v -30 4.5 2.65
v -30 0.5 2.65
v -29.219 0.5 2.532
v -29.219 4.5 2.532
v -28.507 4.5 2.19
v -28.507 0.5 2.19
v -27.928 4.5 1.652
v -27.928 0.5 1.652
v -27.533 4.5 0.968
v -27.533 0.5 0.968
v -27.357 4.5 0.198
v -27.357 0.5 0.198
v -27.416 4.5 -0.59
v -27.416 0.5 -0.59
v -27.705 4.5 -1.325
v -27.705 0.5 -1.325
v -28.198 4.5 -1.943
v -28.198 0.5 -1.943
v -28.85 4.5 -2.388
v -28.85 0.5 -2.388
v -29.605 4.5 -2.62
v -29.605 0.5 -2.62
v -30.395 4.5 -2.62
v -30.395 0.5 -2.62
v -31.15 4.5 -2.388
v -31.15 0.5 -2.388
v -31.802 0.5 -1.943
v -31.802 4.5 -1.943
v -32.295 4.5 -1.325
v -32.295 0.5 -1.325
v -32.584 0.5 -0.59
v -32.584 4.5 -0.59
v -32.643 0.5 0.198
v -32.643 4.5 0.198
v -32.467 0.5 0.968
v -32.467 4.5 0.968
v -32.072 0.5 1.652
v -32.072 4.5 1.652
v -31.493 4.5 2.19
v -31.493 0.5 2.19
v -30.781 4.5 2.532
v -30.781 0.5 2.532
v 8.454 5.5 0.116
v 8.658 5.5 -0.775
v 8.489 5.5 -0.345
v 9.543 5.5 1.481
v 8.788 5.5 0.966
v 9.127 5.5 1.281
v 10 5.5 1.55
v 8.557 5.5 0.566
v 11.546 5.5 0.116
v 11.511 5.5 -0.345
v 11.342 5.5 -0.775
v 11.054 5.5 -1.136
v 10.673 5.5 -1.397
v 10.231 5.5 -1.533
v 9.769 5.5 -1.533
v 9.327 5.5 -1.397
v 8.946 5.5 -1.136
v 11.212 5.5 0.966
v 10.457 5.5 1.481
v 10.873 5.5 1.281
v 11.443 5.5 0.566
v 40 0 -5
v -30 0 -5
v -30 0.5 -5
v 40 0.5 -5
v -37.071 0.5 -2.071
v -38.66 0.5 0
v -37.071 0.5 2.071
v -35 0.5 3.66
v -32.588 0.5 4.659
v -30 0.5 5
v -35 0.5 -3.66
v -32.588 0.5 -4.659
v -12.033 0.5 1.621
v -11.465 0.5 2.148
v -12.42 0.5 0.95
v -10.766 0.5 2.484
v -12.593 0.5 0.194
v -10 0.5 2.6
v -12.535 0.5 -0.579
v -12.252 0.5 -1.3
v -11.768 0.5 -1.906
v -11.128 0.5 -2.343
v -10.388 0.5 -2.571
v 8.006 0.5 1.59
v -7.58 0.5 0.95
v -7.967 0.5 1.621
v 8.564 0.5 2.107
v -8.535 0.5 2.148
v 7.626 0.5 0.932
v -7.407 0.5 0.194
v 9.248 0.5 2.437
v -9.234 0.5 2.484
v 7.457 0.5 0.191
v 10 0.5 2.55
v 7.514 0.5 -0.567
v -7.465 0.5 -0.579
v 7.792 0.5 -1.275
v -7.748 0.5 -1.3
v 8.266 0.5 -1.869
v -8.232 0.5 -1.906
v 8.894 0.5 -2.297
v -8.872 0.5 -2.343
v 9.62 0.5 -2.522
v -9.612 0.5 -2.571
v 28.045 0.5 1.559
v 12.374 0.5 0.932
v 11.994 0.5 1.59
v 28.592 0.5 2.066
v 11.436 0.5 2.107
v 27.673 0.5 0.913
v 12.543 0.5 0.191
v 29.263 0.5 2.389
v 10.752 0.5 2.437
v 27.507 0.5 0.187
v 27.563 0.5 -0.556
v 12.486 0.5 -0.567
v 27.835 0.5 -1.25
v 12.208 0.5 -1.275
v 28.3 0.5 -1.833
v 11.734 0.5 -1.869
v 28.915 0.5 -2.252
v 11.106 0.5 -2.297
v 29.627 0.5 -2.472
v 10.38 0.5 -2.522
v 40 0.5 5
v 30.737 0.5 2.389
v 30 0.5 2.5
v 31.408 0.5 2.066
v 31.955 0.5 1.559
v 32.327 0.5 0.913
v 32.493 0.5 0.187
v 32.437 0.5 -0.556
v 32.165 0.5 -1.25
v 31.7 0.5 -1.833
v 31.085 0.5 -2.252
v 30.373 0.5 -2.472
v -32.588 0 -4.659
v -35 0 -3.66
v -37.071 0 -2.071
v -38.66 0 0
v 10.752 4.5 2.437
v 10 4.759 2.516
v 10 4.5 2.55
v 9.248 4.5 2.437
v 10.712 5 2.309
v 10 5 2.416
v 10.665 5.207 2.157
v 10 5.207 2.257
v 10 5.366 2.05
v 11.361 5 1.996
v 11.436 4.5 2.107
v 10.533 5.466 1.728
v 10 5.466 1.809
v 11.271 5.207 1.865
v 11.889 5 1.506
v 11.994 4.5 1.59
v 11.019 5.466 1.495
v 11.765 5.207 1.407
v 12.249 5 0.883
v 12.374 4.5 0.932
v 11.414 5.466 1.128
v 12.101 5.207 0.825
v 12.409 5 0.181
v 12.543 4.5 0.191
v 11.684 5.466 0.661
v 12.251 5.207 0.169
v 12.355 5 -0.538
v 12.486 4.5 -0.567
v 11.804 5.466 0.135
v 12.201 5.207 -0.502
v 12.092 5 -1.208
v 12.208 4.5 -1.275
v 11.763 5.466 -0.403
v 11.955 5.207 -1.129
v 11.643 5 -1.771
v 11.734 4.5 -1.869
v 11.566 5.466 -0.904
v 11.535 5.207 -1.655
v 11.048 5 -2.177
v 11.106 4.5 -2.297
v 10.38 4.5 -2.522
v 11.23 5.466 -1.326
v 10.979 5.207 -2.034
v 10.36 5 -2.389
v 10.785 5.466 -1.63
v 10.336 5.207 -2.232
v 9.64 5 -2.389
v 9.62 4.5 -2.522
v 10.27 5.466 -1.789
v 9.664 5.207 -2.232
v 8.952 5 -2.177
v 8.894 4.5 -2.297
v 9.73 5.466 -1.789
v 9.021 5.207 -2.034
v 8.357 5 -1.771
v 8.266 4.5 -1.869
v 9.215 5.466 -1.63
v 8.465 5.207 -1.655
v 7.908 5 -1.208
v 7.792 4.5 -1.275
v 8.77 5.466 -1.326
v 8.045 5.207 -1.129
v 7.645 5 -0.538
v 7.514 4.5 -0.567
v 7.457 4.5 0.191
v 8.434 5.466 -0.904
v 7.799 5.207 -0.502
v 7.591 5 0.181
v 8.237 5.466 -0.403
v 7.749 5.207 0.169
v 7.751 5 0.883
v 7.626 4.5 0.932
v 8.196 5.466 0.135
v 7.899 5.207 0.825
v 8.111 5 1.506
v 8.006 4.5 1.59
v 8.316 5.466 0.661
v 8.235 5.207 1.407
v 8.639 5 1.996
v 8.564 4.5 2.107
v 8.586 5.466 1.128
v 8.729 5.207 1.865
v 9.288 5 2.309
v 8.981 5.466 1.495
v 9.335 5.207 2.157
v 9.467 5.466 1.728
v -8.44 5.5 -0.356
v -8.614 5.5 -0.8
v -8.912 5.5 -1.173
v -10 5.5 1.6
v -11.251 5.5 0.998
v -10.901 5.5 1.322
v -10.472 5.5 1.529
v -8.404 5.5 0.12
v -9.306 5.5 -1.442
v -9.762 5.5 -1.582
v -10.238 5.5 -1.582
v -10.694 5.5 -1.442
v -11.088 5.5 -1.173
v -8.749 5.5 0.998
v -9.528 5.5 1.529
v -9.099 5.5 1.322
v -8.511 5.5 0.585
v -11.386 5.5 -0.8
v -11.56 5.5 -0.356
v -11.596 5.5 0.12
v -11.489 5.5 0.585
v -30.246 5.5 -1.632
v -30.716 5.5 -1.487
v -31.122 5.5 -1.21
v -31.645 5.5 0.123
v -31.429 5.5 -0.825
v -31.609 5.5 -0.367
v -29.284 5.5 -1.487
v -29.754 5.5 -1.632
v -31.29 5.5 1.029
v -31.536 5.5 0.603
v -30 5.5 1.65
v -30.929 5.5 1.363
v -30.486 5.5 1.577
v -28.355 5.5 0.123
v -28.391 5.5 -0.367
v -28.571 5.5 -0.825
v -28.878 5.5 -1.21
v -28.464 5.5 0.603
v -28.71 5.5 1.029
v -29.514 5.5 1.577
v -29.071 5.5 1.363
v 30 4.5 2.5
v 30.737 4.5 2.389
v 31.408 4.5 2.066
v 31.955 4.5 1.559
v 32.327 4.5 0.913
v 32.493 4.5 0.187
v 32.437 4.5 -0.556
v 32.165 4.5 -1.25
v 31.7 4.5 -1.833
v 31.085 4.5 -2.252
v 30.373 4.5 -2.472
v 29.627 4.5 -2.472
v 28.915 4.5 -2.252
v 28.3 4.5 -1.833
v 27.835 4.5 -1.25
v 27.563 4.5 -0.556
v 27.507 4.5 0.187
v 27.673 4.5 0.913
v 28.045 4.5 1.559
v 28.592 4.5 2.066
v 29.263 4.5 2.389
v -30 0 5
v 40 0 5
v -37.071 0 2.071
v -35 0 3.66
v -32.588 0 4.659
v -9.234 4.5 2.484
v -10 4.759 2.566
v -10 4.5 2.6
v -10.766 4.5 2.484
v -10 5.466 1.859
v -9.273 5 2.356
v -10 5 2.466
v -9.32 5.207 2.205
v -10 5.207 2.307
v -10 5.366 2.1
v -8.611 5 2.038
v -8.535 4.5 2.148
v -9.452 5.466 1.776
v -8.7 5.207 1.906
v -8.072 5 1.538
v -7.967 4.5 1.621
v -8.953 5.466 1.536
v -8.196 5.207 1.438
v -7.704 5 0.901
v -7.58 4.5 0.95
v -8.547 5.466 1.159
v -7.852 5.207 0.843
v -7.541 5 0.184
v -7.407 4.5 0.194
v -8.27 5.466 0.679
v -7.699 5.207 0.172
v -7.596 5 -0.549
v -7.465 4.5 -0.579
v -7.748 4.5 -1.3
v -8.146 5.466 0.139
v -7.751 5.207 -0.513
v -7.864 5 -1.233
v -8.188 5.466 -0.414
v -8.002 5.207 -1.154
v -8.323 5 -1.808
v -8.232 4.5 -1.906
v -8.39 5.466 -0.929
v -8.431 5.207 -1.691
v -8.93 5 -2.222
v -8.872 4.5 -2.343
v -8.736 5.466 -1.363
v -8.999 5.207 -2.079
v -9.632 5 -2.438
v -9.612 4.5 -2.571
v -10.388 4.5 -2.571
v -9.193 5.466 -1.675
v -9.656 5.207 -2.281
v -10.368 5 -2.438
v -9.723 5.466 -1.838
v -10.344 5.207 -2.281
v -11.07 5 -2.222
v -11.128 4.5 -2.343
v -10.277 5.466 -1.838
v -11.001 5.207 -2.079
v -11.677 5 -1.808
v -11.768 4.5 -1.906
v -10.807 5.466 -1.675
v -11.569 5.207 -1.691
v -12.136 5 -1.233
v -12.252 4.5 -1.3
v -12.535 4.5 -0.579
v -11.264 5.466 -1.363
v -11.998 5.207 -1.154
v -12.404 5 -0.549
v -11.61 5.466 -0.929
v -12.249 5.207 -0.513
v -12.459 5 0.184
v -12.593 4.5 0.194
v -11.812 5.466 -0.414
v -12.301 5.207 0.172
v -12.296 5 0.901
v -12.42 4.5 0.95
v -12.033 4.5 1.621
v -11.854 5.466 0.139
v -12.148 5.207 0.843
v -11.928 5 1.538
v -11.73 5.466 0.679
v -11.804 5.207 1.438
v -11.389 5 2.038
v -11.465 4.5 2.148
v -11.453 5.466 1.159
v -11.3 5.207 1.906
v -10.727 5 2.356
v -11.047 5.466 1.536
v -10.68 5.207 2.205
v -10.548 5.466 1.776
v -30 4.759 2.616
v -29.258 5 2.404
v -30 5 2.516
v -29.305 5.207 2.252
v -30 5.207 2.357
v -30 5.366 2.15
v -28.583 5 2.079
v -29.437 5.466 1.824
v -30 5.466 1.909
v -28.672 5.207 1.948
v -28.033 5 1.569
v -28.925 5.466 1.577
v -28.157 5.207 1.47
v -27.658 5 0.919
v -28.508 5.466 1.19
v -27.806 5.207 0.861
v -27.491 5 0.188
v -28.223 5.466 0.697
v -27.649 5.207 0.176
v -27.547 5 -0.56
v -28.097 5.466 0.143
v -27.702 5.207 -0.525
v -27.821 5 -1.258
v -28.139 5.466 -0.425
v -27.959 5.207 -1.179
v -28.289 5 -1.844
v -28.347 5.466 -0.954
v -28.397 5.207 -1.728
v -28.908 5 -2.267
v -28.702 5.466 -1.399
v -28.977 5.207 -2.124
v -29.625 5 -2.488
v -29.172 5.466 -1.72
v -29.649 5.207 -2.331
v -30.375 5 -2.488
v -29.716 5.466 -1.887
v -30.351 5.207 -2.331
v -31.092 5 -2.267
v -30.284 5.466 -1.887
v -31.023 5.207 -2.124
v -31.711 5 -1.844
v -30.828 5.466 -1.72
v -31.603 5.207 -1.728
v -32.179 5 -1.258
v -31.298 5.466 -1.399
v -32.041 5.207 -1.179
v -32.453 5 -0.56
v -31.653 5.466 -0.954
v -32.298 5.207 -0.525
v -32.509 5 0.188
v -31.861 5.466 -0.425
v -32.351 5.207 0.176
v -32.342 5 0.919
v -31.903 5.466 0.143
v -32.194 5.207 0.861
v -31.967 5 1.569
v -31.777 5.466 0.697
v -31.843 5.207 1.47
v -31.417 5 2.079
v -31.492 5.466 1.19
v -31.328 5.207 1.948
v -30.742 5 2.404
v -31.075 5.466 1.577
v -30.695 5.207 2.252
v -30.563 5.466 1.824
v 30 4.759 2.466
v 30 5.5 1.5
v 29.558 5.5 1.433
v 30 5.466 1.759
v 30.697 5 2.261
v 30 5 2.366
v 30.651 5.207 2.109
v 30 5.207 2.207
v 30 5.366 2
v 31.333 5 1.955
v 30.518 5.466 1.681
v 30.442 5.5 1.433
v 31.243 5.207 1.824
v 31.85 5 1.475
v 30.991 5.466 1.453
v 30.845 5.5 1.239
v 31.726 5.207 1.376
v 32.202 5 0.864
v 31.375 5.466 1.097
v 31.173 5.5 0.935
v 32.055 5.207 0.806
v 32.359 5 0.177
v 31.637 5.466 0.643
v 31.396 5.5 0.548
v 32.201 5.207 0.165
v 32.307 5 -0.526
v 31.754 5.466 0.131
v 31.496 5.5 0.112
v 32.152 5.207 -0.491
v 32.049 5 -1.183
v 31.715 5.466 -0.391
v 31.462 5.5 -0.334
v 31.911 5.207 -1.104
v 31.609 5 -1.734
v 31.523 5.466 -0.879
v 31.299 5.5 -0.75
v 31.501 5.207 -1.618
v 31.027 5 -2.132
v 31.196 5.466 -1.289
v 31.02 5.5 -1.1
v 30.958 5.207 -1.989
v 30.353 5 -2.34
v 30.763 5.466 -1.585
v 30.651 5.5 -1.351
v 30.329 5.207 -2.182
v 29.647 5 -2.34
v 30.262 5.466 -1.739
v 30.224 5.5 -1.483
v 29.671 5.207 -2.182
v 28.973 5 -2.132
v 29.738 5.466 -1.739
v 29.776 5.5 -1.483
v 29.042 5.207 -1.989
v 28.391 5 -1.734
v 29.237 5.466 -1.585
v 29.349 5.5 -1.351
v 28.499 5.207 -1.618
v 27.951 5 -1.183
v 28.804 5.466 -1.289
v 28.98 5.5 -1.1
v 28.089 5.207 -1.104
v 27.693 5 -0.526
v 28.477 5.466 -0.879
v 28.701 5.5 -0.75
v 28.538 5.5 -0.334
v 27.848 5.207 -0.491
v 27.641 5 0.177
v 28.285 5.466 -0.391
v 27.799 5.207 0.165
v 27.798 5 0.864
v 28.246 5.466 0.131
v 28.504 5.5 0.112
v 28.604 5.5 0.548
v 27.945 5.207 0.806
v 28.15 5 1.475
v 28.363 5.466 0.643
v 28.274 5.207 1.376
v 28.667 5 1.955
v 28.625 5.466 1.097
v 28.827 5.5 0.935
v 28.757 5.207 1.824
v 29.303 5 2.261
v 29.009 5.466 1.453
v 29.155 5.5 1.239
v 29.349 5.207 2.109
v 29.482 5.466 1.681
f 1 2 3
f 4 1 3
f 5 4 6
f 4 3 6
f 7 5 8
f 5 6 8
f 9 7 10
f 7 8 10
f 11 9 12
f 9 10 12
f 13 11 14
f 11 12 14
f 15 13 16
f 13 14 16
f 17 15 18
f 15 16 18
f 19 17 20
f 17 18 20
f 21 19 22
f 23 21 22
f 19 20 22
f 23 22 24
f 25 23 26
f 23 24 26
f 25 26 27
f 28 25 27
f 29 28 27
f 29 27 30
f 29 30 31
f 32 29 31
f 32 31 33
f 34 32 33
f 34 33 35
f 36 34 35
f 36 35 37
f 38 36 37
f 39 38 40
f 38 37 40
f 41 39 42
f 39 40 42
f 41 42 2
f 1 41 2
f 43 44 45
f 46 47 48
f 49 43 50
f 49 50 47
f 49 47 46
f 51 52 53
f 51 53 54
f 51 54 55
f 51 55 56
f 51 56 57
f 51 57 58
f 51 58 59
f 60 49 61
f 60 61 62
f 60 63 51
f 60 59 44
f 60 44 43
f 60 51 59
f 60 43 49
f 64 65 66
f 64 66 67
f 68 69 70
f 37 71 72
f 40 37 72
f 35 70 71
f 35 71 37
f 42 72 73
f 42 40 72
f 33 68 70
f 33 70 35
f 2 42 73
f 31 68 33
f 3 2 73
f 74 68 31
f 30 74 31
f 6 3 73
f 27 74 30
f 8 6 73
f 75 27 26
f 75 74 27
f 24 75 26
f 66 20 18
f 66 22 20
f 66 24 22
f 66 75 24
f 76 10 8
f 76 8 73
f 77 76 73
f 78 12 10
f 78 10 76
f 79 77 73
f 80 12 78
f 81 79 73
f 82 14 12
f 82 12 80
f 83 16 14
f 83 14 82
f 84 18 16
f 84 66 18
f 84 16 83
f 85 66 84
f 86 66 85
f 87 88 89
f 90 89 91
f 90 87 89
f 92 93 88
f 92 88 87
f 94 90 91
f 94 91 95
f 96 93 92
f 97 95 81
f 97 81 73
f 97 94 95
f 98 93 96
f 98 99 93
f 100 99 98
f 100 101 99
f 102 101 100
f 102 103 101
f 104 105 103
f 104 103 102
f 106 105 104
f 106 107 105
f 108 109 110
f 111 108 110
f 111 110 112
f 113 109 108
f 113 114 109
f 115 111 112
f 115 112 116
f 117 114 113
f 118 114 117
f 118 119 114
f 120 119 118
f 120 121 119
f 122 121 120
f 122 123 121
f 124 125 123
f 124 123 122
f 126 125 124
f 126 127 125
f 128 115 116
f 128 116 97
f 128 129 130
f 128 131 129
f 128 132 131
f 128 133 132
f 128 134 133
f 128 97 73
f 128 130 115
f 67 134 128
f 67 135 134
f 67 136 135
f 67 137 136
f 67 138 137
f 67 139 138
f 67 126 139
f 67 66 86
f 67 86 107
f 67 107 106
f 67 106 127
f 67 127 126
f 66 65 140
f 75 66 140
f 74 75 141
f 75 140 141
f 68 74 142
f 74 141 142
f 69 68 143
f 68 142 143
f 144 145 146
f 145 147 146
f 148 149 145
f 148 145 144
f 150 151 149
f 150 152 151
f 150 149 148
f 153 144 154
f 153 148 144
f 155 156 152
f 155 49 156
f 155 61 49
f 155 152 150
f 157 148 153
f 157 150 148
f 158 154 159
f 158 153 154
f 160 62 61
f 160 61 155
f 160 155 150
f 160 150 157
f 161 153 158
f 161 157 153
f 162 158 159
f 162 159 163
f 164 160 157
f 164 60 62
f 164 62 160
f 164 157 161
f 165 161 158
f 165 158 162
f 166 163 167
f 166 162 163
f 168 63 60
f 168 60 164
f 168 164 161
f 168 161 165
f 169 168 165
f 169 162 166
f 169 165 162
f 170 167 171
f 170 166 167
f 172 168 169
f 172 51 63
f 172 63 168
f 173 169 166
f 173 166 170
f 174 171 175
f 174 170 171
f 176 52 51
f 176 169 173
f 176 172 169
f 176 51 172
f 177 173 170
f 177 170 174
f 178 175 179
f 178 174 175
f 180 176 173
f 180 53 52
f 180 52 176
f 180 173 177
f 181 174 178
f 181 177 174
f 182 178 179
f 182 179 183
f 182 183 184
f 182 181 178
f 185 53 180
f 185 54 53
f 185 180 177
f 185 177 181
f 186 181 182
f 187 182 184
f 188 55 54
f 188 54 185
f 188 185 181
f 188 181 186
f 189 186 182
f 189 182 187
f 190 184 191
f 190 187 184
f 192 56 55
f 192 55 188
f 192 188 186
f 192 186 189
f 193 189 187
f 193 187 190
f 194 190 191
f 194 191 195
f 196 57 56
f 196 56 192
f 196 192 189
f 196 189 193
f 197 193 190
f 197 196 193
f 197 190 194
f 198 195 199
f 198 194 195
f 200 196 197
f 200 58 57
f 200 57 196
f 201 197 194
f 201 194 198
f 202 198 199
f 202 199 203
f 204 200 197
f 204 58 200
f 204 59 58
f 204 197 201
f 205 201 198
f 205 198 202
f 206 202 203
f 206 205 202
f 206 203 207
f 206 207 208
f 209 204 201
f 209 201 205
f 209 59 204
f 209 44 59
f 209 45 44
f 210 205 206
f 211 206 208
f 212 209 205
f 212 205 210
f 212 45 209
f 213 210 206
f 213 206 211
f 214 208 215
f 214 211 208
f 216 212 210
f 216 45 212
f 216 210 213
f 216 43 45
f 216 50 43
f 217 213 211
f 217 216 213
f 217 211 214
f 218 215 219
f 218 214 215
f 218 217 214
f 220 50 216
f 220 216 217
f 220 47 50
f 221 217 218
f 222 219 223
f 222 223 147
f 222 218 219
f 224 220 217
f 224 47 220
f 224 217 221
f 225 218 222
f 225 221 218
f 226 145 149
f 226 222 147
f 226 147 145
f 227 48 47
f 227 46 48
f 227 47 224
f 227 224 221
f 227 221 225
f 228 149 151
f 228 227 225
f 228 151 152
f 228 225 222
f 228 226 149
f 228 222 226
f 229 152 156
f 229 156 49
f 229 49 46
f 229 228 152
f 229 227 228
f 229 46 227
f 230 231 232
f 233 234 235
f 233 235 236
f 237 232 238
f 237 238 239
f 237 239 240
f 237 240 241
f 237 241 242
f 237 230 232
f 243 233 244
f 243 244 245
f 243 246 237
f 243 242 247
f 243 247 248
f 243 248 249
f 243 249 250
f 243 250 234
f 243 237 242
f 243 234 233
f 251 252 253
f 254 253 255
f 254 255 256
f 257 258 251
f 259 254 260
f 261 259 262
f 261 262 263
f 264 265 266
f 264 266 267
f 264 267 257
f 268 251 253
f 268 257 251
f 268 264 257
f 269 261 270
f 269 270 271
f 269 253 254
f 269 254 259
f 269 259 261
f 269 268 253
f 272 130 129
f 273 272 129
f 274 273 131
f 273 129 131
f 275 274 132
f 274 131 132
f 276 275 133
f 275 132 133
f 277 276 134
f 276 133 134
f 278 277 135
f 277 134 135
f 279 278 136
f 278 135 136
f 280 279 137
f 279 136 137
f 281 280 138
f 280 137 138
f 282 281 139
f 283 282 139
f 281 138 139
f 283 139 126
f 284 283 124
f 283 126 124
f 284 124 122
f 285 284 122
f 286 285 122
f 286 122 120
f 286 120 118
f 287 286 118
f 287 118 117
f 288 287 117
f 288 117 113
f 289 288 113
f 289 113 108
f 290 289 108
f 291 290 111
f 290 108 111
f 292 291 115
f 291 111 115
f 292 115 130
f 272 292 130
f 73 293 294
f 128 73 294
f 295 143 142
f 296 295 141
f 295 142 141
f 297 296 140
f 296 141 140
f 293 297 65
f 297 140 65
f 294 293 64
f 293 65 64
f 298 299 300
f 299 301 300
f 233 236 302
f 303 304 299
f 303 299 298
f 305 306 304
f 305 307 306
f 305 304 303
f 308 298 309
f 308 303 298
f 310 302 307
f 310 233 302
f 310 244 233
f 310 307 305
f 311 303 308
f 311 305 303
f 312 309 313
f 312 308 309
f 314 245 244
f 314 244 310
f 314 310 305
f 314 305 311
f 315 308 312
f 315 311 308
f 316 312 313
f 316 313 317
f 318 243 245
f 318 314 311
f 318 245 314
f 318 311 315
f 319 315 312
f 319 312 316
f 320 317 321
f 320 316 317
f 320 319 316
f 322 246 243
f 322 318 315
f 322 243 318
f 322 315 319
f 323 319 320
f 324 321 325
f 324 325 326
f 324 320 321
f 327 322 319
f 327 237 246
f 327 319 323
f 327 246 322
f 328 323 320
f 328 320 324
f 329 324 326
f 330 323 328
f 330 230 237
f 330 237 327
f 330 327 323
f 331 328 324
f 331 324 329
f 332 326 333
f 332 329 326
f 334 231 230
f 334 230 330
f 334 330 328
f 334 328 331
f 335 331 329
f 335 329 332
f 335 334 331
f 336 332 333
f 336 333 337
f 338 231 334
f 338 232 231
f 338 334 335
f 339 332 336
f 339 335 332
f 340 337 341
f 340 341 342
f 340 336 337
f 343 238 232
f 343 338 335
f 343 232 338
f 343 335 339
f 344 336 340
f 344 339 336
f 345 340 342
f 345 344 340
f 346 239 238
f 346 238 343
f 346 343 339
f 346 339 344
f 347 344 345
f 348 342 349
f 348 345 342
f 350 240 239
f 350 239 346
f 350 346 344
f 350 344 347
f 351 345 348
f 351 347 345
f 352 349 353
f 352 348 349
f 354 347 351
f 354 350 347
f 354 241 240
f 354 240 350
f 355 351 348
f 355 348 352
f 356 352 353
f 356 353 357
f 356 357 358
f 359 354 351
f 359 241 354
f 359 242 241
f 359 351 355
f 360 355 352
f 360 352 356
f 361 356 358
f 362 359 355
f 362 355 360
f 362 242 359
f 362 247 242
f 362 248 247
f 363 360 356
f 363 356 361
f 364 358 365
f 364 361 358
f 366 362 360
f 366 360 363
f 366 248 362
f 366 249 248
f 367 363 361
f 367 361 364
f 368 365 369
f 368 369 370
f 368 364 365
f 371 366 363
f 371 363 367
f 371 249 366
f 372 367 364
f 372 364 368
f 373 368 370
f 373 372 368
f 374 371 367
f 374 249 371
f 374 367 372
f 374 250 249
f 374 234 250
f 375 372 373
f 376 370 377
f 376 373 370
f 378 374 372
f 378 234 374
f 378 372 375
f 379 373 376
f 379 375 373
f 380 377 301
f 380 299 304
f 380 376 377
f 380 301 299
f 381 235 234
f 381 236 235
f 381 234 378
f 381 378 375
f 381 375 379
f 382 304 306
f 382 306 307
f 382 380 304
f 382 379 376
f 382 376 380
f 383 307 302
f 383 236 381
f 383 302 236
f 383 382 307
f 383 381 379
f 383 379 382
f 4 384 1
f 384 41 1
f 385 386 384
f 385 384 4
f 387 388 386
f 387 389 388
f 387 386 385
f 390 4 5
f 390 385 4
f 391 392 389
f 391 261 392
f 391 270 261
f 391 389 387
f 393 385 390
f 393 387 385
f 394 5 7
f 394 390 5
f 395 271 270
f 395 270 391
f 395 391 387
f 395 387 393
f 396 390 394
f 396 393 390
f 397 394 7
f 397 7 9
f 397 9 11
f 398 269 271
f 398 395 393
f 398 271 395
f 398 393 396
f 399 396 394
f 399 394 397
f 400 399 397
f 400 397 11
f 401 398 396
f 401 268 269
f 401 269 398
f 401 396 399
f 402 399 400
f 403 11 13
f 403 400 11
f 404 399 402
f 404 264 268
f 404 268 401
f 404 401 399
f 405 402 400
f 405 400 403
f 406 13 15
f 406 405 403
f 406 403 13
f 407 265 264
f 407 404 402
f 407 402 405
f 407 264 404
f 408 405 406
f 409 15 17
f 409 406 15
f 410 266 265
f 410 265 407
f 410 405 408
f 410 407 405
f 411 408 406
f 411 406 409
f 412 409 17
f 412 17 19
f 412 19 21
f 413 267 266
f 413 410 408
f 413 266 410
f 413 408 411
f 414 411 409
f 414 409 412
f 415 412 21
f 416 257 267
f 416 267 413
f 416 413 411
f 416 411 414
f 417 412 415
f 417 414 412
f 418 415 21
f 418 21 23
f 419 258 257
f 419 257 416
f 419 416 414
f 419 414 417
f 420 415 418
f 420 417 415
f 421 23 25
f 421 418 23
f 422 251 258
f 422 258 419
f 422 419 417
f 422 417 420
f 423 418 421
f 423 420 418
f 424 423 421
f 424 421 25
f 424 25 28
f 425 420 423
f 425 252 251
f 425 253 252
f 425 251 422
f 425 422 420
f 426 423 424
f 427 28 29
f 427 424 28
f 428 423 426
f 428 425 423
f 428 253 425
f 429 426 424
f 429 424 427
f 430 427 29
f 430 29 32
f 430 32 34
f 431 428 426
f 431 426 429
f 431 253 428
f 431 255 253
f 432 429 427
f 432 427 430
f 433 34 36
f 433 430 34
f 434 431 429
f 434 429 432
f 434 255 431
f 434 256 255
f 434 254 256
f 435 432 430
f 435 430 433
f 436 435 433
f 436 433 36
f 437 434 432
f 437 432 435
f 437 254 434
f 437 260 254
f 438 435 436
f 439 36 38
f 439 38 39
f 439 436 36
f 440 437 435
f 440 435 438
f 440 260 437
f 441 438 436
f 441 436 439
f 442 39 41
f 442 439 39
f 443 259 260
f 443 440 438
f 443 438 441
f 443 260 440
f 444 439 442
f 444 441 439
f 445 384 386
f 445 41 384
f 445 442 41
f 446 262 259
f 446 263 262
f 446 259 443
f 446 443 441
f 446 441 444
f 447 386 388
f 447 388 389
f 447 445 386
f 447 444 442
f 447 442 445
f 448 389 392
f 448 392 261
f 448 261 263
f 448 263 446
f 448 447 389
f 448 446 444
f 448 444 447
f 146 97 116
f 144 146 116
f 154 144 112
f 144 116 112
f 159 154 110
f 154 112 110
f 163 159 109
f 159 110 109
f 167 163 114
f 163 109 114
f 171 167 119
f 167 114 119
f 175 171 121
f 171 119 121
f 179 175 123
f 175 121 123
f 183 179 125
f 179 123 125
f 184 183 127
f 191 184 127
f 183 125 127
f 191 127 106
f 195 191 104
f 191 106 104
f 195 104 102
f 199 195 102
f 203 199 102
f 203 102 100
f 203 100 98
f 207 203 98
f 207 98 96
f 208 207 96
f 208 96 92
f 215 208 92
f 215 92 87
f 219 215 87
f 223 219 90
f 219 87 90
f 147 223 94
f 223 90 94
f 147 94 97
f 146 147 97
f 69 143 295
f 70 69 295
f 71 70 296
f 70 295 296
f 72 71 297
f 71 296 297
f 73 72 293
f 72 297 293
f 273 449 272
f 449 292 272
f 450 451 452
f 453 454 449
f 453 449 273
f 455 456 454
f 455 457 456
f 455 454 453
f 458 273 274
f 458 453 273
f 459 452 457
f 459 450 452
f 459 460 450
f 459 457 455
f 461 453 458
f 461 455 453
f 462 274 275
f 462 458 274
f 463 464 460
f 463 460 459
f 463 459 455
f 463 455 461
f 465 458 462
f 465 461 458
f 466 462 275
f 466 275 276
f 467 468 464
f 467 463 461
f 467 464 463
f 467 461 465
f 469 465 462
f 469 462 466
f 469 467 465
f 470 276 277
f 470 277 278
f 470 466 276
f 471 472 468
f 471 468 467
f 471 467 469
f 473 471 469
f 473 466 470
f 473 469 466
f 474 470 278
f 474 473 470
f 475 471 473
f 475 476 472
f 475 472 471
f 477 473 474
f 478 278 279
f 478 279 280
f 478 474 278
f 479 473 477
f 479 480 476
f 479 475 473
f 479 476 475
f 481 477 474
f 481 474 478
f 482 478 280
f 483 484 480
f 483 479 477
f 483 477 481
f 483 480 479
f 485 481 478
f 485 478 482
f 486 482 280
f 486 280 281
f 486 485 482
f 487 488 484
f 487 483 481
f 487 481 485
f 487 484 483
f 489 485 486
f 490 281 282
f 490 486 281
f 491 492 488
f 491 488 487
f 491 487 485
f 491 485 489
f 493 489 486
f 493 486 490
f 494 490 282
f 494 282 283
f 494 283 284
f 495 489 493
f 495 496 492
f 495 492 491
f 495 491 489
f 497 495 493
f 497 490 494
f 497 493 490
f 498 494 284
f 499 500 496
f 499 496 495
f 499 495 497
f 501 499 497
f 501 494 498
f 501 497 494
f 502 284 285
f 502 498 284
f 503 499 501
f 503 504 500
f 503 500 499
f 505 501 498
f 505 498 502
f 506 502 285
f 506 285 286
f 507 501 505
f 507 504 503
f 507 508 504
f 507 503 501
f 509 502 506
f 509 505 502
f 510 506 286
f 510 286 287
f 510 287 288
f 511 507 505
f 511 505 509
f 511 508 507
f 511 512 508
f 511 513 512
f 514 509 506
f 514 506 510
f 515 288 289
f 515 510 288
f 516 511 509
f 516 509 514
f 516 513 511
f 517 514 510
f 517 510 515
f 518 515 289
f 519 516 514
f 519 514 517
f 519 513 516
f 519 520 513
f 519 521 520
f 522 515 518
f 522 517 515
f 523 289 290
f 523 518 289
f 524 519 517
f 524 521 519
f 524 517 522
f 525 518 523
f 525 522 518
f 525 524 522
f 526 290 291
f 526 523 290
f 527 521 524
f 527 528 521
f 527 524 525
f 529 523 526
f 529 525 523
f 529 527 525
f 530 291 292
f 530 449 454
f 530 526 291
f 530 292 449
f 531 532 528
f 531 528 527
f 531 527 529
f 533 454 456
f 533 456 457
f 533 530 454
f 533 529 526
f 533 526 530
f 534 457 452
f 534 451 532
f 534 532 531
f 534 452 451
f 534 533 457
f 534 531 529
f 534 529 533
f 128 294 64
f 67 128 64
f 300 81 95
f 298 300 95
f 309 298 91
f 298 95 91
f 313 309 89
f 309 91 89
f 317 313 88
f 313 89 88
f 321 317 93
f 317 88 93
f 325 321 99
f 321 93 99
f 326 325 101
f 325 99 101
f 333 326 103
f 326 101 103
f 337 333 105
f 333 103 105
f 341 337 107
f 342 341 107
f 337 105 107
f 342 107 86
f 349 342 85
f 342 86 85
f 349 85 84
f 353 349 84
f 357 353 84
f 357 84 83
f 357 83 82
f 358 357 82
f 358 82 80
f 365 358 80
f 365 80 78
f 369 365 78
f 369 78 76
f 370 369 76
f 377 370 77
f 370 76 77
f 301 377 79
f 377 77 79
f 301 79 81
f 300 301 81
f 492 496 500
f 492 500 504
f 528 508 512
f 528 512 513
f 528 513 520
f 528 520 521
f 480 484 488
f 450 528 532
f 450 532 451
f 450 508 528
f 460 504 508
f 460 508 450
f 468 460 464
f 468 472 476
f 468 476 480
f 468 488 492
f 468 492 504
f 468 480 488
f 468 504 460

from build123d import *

# Parameters (mm, degrees)
SKETCH2_W           = 80
SKETCH2_H           = 10
BOSS_EXTRUDE1_DEPTH = 0.5
SKETCH3_R           = 2.65
SKETCH3_R_2         = 2.6
SKETCH3_R_3         = 2.55
SKETCH3_R_4         = 2.5
BOSS_EXTRUDE2_DEPTH = 5
FILLET1_R           = 1
FILLET2_R           = 10


with BuildPart() as part:
    # Sketch2 → Boss-Extrude1 (new body)
    with BuildSketch(Plane(origin=(0, 0, 0), x_dir=(1, 0, 0), z_dir=(0, 1, 0))):
        Rectangle(SKETCH2_W, SKETCH2_H)
    extrude(amount=BOSS_EXTRUDE1_DEPTH)

    # Sketch3 → Boss-Extrude2 (add)
    with BuildSketch(Plane(origin=(0, 0.5, 0), x_dir=(1, 0, 0), z_dir=(0, 1, 0))):
        with Locations(Location((-30, 0, 0), (0, 0, 270))):
            Circle(SKETCH3_R)
        with Locations(Location((-10, 0, 0), (0, 0, 270))):
            Circle(SKETCH3_R_2)
        with Locations(Location((10, 0, 0), (0, 0, 270))):
            Circle(SKETCH3_R_3)
        with Locations(Location((30, 0, 0), (0, 0, 270))):
            Circle(SKETCH3_R_4)
    extrude(amount=BOSS_EXTRUDE2_DEPTH)

    # Fillet1
    fillet1_edges = [part.edges().sort_by_distance(p)[0] for p in [
        (-30, 5.5, -2.65),
        (-10, 5.5, -2.6),
        (10, 5.5, -2.55),
        (30, 5.5, -2.5),
    ]]
    fillet(fillet1_edges, radius=FILLET1_R)

    # Fillet2
    # the kernel refuses this fillet: 10 mm, written as the material it takes off along each edge
    with BuildSketch(Plane(origin=(-40, -25, -5), x_dir=(1, 0, 0), z_dir=(0, 1, 0)), Plane(origin=(-40, -25, 5), x_dir=(0, 0, -1), z_dir=(0, 1, 0))) as fillet2_piece_1:
        with BuildLine():
            CenterArc((FILLET2_R, -FILLET2_R), FILLET2_R, 90, 90)
            Line((0, -FILLET2_R), (0, 0))
            Line((0, 0), (FILLET2_R, 0))
        make_face()
    extrude(amount=50.5, mode=Mode.SUBTRACT)


solid = part.part
